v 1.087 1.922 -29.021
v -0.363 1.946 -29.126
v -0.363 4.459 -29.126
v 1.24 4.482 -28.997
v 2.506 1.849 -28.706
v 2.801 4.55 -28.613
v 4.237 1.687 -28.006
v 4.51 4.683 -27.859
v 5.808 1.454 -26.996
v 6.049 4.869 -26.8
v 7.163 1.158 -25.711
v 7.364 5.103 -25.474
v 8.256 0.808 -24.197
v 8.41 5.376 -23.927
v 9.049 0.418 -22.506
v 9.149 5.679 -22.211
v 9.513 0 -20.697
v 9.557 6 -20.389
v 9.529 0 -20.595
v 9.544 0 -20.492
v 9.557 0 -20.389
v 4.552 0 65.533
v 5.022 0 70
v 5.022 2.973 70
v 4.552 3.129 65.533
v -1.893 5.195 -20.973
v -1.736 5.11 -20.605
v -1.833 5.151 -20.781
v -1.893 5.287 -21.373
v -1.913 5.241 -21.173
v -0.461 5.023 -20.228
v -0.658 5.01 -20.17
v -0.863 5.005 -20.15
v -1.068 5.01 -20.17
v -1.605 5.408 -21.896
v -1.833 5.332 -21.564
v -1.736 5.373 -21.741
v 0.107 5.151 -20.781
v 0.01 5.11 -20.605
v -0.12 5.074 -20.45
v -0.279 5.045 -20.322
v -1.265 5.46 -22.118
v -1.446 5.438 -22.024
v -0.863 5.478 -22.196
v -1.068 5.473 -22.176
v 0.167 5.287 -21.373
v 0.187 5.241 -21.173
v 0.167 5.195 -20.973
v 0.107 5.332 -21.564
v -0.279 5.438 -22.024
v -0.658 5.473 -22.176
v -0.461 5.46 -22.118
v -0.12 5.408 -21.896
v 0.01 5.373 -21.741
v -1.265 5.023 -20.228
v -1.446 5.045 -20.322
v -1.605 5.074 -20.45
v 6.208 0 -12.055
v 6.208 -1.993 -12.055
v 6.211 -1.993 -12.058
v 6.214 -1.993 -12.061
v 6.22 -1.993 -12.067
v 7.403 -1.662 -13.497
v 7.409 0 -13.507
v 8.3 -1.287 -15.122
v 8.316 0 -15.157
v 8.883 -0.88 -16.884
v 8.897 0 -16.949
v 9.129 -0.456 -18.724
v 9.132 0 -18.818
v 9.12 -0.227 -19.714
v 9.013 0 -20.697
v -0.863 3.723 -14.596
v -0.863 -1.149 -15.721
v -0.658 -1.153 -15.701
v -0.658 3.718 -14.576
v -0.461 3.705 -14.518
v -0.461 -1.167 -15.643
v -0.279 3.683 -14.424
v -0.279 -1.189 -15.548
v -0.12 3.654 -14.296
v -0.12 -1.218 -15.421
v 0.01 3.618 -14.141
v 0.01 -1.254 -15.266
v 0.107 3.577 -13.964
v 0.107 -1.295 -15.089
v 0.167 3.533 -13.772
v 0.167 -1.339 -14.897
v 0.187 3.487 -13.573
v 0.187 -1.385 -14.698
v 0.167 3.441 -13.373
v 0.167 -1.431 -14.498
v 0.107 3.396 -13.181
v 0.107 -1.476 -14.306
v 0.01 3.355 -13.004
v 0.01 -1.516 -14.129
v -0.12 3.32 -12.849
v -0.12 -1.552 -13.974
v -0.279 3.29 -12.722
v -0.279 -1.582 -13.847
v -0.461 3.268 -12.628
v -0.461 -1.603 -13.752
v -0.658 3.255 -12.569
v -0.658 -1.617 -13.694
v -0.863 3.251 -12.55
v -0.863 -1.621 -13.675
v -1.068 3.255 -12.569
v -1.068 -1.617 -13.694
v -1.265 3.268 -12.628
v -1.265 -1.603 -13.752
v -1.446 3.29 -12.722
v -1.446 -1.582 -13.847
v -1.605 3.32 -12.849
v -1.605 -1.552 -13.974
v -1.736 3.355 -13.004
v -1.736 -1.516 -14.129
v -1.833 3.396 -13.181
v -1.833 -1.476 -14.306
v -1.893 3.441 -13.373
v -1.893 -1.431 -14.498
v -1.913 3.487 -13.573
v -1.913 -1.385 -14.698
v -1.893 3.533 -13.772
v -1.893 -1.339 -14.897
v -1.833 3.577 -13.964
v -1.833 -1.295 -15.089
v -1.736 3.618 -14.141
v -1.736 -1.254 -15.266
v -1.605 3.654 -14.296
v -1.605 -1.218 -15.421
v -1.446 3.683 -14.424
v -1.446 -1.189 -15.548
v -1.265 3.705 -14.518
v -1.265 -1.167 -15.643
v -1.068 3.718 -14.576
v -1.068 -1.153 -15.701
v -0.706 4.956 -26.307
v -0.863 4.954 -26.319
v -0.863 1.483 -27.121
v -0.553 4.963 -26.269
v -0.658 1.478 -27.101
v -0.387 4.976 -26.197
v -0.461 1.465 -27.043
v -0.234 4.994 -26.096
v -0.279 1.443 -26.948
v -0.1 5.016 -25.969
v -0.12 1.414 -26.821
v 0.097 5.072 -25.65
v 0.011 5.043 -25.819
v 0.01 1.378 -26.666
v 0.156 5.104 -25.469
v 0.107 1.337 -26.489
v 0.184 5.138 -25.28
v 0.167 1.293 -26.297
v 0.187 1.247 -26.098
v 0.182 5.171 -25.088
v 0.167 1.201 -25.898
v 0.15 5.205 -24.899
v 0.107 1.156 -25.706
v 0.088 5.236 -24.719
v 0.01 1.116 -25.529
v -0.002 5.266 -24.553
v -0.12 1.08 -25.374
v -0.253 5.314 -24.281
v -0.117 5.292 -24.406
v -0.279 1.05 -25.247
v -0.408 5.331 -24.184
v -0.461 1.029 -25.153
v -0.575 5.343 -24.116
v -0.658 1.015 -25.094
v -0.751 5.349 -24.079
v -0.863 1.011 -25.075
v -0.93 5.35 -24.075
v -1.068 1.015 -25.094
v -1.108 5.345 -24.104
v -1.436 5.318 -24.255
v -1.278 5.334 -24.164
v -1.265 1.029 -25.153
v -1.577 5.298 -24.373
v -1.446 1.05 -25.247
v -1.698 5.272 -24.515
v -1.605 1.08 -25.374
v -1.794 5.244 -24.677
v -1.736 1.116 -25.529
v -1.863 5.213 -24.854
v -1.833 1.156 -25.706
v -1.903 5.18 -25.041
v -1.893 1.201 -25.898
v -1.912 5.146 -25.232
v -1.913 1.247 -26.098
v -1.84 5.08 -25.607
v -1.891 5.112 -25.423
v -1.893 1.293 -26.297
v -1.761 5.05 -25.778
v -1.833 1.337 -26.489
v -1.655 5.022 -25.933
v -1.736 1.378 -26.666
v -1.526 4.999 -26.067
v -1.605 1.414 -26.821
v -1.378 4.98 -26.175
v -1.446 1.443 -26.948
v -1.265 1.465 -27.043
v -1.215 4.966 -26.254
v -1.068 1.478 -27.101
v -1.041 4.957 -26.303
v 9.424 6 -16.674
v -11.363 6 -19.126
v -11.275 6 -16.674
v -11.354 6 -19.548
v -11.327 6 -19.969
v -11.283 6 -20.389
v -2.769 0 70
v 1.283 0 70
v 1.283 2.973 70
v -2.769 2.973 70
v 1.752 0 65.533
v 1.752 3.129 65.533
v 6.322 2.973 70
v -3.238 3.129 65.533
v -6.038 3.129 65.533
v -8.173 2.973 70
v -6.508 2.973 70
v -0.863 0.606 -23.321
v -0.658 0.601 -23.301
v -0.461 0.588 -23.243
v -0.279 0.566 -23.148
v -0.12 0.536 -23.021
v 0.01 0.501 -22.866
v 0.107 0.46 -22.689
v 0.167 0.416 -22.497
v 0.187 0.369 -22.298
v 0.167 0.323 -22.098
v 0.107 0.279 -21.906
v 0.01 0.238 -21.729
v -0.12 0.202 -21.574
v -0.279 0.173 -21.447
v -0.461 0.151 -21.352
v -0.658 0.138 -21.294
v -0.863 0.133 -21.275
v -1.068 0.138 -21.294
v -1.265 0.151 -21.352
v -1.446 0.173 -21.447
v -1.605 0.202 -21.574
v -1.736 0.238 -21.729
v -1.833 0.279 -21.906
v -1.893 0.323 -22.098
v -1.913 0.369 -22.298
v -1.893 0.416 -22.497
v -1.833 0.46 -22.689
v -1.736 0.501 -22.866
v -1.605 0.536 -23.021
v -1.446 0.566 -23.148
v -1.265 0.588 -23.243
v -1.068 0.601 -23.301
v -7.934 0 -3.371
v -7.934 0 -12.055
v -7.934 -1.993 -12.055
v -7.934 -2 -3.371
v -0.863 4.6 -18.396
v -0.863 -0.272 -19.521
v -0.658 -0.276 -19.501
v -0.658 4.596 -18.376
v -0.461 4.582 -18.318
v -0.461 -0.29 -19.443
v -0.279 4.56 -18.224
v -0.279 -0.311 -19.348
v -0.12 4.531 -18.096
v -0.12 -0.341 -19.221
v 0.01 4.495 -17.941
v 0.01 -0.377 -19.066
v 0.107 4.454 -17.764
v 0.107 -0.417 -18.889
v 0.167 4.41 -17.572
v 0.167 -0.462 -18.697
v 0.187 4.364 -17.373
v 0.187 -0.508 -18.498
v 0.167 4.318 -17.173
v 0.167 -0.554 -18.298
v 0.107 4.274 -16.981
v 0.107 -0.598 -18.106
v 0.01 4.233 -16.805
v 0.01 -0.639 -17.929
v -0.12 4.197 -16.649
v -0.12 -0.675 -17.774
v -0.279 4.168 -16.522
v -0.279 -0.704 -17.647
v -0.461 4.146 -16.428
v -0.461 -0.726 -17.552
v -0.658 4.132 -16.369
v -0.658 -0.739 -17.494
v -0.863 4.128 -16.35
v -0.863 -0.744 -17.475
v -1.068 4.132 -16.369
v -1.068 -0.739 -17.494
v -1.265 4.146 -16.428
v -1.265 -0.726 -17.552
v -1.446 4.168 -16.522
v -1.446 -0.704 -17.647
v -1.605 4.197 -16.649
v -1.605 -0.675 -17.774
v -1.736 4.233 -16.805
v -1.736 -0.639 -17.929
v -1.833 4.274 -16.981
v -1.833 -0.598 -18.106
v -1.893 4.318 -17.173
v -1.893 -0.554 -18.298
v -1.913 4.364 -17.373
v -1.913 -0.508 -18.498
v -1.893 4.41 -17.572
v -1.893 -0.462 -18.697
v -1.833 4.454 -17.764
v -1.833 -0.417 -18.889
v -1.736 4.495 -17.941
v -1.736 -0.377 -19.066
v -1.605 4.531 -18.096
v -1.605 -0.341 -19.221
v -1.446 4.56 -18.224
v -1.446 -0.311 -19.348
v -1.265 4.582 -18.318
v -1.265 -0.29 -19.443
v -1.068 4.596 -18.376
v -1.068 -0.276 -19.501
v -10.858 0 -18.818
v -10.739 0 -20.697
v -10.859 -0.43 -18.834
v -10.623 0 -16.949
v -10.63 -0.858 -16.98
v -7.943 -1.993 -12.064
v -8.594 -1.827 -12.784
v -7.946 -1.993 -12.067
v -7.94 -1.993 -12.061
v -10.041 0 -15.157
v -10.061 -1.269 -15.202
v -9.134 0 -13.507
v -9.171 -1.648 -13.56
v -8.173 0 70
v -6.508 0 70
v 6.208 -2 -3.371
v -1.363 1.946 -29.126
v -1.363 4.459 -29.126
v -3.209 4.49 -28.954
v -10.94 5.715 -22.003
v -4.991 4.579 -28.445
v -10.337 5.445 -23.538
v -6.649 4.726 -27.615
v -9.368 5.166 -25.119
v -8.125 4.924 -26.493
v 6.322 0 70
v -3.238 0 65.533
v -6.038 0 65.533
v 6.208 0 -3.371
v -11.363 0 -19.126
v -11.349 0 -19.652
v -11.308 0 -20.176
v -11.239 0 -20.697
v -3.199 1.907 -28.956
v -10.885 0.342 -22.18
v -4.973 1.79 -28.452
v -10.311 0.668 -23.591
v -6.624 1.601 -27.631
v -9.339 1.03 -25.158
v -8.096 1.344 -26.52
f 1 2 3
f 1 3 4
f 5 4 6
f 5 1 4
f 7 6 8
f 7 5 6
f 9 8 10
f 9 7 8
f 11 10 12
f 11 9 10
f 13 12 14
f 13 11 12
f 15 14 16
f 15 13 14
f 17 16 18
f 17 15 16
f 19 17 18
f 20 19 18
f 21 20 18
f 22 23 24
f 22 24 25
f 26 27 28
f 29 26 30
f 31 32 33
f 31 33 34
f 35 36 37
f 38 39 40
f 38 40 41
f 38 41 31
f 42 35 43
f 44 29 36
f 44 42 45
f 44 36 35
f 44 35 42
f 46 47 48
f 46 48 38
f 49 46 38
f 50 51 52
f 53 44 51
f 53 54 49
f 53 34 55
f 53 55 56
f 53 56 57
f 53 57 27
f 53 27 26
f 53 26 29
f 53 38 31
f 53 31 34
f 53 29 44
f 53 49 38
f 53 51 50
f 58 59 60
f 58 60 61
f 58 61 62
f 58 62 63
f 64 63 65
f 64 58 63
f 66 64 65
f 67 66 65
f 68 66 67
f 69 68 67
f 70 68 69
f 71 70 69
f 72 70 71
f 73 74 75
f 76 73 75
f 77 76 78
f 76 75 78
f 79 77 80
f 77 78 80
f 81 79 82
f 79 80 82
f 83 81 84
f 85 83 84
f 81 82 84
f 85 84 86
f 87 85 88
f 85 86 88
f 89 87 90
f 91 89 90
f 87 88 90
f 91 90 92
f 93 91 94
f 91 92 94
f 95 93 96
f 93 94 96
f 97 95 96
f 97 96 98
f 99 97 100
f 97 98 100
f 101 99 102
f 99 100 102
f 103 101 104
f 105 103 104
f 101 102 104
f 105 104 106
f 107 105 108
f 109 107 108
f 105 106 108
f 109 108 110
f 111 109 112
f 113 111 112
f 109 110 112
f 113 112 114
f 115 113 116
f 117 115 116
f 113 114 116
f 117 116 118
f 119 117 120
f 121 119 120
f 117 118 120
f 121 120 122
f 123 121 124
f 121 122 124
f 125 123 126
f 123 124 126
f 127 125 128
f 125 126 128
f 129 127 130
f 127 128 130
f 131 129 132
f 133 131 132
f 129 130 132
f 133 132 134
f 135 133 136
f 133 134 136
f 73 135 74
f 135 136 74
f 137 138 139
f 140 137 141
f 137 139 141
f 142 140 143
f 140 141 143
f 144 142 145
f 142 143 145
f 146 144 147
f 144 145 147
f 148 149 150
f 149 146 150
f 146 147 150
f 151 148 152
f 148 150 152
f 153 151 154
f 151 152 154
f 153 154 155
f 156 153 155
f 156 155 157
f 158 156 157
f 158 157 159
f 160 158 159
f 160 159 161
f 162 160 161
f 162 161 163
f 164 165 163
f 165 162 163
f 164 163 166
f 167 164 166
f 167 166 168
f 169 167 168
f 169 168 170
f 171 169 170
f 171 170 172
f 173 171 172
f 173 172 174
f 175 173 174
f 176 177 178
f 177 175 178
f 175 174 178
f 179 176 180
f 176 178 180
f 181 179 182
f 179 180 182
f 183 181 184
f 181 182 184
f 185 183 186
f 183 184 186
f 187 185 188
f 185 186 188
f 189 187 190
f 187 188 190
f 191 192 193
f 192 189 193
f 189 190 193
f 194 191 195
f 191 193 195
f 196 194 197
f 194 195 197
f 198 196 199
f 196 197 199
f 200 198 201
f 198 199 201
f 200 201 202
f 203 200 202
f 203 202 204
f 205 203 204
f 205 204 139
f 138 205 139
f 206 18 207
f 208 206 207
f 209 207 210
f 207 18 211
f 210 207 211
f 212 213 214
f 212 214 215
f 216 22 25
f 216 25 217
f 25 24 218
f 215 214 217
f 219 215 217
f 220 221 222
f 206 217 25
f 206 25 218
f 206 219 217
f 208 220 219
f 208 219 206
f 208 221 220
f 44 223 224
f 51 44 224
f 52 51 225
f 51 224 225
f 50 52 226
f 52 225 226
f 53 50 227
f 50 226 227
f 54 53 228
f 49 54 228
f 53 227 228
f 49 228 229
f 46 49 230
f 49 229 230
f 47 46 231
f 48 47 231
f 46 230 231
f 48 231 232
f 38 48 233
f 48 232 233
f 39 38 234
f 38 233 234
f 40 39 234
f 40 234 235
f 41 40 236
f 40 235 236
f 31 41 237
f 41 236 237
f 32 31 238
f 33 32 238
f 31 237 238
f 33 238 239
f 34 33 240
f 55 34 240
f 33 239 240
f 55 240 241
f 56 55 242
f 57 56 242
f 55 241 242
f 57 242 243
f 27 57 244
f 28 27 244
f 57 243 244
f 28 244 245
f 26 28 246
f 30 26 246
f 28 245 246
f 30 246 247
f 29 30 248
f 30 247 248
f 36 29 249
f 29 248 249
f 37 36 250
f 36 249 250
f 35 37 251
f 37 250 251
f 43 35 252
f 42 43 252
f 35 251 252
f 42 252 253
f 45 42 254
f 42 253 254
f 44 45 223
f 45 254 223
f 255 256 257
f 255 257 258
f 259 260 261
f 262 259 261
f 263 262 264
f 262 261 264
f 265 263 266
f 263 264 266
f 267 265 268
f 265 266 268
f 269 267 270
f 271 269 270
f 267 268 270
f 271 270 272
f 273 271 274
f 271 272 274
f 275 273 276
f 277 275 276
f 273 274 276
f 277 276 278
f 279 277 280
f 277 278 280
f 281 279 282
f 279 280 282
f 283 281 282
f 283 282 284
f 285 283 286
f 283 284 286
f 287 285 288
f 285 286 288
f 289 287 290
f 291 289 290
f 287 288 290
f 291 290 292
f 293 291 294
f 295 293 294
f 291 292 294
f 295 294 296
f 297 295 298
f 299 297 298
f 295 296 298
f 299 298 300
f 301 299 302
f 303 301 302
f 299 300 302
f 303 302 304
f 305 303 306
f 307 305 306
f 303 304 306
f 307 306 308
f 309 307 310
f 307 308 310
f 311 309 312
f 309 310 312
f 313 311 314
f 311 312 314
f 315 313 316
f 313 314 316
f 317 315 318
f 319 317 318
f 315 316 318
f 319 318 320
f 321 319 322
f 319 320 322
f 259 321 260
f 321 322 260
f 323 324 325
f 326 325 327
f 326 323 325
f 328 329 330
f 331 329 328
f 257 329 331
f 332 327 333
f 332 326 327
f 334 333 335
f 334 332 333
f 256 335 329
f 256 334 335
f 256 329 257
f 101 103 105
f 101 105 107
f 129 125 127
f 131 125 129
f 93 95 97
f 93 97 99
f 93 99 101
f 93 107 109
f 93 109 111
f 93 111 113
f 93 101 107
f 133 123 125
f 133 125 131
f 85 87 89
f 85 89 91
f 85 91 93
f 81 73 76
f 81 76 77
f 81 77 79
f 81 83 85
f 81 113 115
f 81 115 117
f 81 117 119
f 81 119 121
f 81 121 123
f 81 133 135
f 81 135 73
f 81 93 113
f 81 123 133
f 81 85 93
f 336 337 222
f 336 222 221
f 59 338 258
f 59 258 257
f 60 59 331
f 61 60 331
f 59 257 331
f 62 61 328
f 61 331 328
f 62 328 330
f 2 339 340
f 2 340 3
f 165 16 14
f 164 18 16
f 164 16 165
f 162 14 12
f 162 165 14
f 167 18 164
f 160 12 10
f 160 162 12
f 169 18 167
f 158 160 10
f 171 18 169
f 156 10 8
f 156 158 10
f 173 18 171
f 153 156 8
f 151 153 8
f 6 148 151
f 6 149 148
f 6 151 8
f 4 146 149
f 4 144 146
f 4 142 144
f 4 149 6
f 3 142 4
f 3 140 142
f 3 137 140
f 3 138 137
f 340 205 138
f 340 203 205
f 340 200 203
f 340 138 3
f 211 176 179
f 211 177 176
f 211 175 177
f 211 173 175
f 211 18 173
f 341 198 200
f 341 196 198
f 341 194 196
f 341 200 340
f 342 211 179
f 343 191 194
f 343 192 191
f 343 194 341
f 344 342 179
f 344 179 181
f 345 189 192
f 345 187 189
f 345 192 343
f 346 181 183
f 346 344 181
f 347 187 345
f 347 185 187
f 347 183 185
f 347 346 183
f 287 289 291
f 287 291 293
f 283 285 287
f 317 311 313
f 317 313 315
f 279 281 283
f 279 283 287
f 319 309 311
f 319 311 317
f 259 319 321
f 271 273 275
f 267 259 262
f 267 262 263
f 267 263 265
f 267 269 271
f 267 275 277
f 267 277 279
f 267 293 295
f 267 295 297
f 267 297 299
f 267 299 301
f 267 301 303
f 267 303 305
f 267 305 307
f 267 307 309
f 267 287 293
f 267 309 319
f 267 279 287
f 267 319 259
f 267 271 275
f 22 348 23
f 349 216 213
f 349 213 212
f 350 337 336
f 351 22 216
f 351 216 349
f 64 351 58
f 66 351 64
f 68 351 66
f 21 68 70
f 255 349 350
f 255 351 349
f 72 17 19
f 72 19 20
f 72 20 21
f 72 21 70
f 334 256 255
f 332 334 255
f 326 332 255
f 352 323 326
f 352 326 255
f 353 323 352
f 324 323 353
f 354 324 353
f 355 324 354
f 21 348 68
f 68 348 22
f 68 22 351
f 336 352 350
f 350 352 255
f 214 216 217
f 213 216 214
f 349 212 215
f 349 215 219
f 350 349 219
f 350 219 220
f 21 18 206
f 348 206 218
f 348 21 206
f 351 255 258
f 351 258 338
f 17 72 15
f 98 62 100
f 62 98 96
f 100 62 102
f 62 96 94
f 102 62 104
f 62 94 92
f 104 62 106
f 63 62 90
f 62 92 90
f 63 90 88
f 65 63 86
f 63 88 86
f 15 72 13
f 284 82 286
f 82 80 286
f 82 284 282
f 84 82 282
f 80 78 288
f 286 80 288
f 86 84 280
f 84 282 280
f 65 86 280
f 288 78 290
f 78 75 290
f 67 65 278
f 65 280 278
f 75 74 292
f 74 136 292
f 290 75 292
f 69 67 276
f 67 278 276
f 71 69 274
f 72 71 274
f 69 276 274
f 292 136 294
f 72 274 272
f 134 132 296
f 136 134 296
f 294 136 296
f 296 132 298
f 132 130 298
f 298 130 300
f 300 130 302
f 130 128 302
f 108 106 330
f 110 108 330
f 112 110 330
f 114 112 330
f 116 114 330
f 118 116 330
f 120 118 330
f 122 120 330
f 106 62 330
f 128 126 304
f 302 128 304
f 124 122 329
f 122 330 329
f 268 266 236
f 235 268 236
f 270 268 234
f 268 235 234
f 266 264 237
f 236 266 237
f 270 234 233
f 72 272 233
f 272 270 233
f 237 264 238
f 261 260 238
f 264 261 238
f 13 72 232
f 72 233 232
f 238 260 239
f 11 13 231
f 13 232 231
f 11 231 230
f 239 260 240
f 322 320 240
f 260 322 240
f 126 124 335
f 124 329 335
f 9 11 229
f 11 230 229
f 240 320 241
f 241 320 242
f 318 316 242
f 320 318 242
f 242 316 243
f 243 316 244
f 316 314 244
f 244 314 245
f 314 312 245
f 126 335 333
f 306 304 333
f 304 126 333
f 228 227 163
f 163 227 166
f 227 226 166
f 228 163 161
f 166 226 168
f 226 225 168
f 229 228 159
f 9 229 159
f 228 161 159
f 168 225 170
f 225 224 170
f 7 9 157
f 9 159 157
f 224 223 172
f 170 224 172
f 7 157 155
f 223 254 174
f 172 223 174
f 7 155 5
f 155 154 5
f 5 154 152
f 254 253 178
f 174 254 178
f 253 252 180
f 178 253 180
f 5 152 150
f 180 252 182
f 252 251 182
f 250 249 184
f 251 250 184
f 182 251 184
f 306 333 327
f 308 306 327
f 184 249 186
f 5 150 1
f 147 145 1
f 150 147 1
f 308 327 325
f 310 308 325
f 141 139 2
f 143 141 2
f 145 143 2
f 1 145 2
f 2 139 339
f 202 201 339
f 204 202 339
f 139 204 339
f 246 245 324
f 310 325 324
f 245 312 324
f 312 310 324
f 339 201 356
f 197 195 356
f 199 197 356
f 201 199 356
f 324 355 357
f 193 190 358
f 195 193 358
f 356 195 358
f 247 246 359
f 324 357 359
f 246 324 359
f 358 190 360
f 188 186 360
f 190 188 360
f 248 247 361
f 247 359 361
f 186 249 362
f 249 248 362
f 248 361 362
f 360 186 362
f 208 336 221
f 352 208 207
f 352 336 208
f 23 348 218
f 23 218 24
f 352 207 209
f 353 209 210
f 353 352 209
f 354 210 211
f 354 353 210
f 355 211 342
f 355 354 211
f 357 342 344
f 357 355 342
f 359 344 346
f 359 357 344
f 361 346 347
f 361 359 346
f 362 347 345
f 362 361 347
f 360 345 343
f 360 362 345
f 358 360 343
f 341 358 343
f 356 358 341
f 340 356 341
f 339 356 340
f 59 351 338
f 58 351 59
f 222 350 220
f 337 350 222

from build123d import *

# Parameters (mm, degrees)
AUFSATZ_LINEAR_AUSTRAGEN1_DEPTH      = 6
SCHNITT_LINEAR_AUSTRAGEN1_DEPTH      = 72.169611735
SCHNITT_LINEAR_AUSTRAGEN1_DEPTH_BACK = 72.169611735
SCHNITT_LINEAR_AUSTRAGEN2_DEPTH      = 72.169611735
SCHNITT_LINEAR_AUSTRAGEN2_DEPTH_BACK = 72.169611735
AUFSATZ_LINEAR_AUSTRAGEN2_DEPTH      = 4
SCHNITT_LINEAR_AUSTRAGEN3_DEPTH      = 72.169611735
SCHNITT_LINEAR_AUSTRAGEN3_DEPTH_BACK = 72.169611735
SKIZZE7_R                            = 1.05
SCHNITT_LINEAR_AUSTRAGEN4_DEPTH      = 5


with BuildPart() as part:
    # Skizze1 → Aufsatz-Linear austragen1 (new body)
    with BuildSketch(Plane(origin=(0, 0, 0), x_dir=(1, 0, 0), z_dir=(0, 1, 0))):
        with BuildLine():
            Line((9.557167706, 20.388739502), (6.321745697, -70))
            Line((6.321745697, -70), (5.021745697, -70))
            Line((5.021745697, -70), (4.552285436, -65.533383981))
            Line((4.552285436, -65.533383981), (1.752285436, -65.533383981))
            Line((1.752285436, -65.533383981), (1.282825175, -70))
            Line((1.282825175, -70), (-2.768942942, -70))
            Line((-2.768942942, -70), (-3.238403203, -65.533383981))
            Line((-3.238403203, -65.533383981), (-6.038403203, -65.533383981))
            Line((-6.038403203, -65.533383981), (-6.507863464, -70))
            Line((-6.507863464, -70), (-8.17258631, -70))
            Line((-8.17258631, -70), (-11.362818073, 19.126249046))
            ThreePointArc((-11.362818073, 19.126249046), (-8.433885885, 26.197316858), (-1.362818073, 29.126249046))
            Line((-1.362818073, 29.126249046), (-0.362818073, 29.126249046))
            ThreePointArc((-0.362818073, 29.126249046), (6.24683757, 26.630411376), (9.557167706, 20.388739502))
        make_face()
    extrude(amount=AUFSATZ_LINEAR_AUSTRAGEN1_DEPTH)

    # Skizze3 → Schnitt-Linear austragen1 (cut, two sides: drawn at the far end of the back side and taken through both)
    with BuildSketch(Plane(origin=(0, 0, 0), x_dir=(0, 0, -1), z_dir=(1, 0, 0)).offset(-SCHNITT_LINEAR_AUSTRAGEN1_DEPTH_BACK)):
        Polygon((16.673690486, 6), (-70, 6), (-70, 2.973288034), align=None)
    extrude(amount=SCHNITT_LINEAR_AUSTRAGEN1_DEPTH + SCHNITT_LINEAR_AUSTRAGEN1_DEPTH_BACK, mode=Mode.SUBTRACT)

    # Skizze4 → Schnitt-Linear austragen2 (cut, two sides: drawn at the far end of the back side and taken through both)
    with BuildSketch(Plane(origin=(0, 0, 0), x_dir=(0, 0, -1), z_dir=(1, 0, 0)).offset(-SCHNITT_LINEAR_AUSTRAGEN2_DEPTH_BACK)):
        Polygon((20.388739502, 6), (29.126249046, 4.459341323), (29.126249046, 6), align=None)
    extrude(amount=SCHNITT_LINEAR_AUSTRAGEN2_DEPTH + SCHNITT_LINEAR_AUSTRAGEN2_DEPTH_BACK, mode=Mode.SUBTRACT)

    # Skizze5 → Aufsatz-Linear austragen2 (add)
    with BuildSketch(Plane.XZ):
        with BuildLine():
            Line((-7.933885885, -12.055181234), (-7.933885885, -3.371441204))
            Line((-7.933885885, -3.371441204), (6.208249739, -3.371441204))
            Line((6.208249739, -3.371441204), (6.208249739, -12.055181234))
            ThreePointArc((6.208249739, -12.055181234), (-0.862818073, -29.126249046), (-7.933885885, -12.055181234))
        make_face()
    extrude(amount=AUFSATZ_LINEAR_AUSTRAGEN2_DEPTH)

    # Skizze6 → Schnitt-Linear austragen3 (cut, two sides: drawn at the far end of the back side and taken through both)
    with BuildSketch(Plane(origin=(0, 0, 0), x_dir=(0, 0, -1), z_dir=(1, 0, 0)).offset(-SCHNITT_LINEAR_AUSTRAGEN3_DEPTH_BACK)):
        Polygon((12.066816312, -1.992514478), (29.126249046, 1.945965899), (29.126249046, -4), (3.371441204, -4), (3.371441204, -2), align=None)
    extrude(amount=SCHNITT_LINEAR_AUSTRAGEN3_DEPTH + SCHNITT_LINEAR_AUSTRAGEN3_DEPTH_BACK, mode=Mode.SUBTRACT)

    # Skizze7 → Schnitt-Linear austragen4 (cut)
    with BuildSketch(Plane(origin=(0, -4.536559366, -1.047347255), x_dir=(1, 0, 0), z_dir=(0, -0.9743700647852368, -0.22495105434385881))):
        with Locations(Location((-0.862818073, -14.009326359, 0), (0, 0, 270))):
            Circle(SKIZZE7_R)
        with Locations(Location((-0.862818073, -17.909326359, 0), (0, 0, 270))):
            Circle(SKIZZE7_R)
        with Locations(Location((-0.862818073, -21.809326359, 0), (0, 0, 270))):
            Circle(SKIZZE7_R)
        with Locations(Location((-0.862818073, -25.709326359, 0), (0, 0, 270))):
            Circle(SKIZZE7_R)
    extrude(amount=-SCHNITT_LINEAR_AUSTRAGEN4_DEPTH, mode=Mode.SUBTRACT)


solid = part.part
